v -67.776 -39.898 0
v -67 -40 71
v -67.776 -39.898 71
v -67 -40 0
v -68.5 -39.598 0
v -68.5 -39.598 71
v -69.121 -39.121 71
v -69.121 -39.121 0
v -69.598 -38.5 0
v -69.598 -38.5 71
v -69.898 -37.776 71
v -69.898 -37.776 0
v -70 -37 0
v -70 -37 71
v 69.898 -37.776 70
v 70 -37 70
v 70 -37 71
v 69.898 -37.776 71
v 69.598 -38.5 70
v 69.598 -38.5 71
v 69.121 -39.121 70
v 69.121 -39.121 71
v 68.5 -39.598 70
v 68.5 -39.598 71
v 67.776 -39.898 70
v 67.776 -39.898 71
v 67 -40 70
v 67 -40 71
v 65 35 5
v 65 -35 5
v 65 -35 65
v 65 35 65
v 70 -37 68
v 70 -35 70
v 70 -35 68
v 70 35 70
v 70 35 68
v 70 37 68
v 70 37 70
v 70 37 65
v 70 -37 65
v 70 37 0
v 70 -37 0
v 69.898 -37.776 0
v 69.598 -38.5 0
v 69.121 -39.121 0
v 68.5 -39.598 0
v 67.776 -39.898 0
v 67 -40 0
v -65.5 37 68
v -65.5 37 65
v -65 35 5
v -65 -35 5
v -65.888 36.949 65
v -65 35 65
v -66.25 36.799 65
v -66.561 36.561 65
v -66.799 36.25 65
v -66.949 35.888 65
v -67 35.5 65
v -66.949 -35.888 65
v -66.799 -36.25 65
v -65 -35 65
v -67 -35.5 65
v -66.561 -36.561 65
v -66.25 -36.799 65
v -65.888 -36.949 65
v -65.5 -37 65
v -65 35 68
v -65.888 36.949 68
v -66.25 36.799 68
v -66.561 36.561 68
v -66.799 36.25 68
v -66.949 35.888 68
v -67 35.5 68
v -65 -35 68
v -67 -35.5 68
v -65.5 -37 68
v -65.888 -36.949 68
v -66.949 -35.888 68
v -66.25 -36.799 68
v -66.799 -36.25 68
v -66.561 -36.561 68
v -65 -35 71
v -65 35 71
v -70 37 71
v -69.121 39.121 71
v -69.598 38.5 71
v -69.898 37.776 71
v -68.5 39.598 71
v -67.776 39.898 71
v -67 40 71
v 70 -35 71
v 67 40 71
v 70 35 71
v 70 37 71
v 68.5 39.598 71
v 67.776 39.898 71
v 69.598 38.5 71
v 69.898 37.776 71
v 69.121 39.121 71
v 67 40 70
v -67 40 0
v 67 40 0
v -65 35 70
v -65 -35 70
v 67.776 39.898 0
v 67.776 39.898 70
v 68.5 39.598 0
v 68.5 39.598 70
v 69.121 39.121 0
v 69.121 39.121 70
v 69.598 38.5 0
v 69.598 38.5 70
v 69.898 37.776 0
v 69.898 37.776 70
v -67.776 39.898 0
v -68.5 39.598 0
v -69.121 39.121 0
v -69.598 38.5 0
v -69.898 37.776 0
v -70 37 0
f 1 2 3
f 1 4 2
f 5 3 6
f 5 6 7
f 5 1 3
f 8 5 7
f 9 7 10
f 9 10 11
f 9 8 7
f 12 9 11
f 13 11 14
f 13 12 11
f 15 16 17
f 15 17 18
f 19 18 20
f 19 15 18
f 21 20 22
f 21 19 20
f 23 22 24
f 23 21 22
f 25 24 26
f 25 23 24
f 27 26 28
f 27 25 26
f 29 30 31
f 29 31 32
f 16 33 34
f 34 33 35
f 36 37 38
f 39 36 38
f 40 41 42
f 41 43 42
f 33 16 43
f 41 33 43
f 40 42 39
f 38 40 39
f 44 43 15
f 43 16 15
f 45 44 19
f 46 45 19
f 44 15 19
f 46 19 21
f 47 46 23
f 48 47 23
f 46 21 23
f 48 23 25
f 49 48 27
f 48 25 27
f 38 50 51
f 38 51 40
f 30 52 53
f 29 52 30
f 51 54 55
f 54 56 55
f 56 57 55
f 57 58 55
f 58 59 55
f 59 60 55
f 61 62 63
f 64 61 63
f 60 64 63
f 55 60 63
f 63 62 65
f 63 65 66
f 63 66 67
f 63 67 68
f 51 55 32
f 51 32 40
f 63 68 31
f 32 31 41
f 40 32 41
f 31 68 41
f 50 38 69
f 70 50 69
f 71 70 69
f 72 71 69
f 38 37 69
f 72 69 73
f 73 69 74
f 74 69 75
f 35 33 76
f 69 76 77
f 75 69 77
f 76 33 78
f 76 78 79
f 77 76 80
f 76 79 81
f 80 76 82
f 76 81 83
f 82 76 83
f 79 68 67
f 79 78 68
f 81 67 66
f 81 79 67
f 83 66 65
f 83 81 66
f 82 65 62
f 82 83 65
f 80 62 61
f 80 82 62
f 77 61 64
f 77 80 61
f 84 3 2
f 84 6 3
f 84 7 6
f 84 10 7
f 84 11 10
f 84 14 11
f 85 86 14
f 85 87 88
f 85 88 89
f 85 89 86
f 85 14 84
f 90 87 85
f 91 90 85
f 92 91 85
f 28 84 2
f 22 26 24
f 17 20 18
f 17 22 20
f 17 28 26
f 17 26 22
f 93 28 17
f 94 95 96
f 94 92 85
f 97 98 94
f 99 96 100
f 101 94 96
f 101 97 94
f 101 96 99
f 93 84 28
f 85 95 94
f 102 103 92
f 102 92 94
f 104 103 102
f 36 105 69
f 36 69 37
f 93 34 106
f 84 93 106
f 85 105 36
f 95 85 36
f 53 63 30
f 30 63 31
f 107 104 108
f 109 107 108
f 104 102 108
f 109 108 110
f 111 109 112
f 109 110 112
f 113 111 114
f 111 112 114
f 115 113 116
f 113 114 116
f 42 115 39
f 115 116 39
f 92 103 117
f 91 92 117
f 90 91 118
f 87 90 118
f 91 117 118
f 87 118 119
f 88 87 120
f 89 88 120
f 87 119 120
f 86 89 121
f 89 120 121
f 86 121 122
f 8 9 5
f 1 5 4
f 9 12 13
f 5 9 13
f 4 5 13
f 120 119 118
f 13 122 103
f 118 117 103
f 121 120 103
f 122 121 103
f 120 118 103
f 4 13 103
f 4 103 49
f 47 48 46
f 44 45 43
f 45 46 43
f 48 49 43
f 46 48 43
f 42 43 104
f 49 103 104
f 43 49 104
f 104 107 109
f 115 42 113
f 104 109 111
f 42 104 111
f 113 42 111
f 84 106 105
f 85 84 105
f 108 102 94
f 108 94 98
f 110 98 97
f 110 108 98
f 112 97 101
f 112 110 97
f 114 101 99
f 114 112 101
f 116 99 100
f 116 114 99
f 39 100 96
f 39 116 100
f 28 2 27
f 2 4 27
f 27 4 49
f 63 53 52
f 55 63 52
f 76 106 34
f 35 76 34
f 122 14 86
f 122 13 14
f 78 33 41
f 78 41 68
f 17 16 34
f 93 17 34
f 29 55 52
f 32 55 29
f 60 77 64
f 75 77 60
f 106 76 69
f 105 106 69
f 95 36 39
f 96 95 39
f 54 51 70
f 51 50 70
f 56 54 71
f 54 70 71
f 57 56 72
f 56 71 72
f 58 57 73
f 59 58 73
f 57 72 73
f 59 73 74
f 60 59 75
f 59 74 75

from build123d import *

# Parameters (mm, degrees)
F0_W      = 140
F0_H      = 80
F0_W_2    = 130
F0_H_2    = 70
F1_DEPTH  = 70
F2_DEPTH  = 5
F3_W      = 5
F3_H      = 70
F4_DEPTH  = 5
F6_DEPTH  = 2
F8_DEPTH  = 2
F10_DEPTH = 2
F11_R     = 2.99999
F12_R     = 1.5
F13_DEPTH = 1


# Not quite as in the source:
# - a fillet or chamfer is up to 0.001 mm smaller than in the source, because OpenCascade refuses the exact size


with BuildPart() as f1:
    # F0 (on Top) → F1 (new body)
    with BuildSketch(Plane.XY):
        Rectangle(F0_W, F0_H)
        Rectangle(F0_W_2, F0_H_2, mode=Mode.SUBTRACT)
    extrude(amount=F1_DEPTH)

    # F0 (on Top) → F2 (join)
    with BuildSketch(Plane.XY):
        Rectangle(F0_W_2, F0_H_2)
    extrude(amount=F2_DEPTH)

    # F3 (on face) → F4 (cut)
    with BuildSketch(Plane.XY.offset(70)):
        with Locations((67.5, 0)):
            Rectangle(F3_W, F3_H)
    extrude(amount=-F4_DEPTH, mode=Mode.SUBTRACT)

    # F5 (on face) → F6 (cut)
    with BuildSketch(Plane.XZ.offset(-35)):
        Polygon((65, 65), (70, 65), (70, 68), (-65, 68), (-65, 65), align=None)
    extrude(amount=-F6_DEPTH, mode=Mode.SUBTRACT)

    # F7 (on face) → F8 (cut)
    with BuildSketch(Plane.YZ.offset(-65)):
        Polygon((35, 65), (37, 65), (37, 68), (35, 68), (-35, 68), (-35, 65), align=None)
    extrude(amount=-F8_DEPTH, mode=Mode.SUBTRACT)

    # F9 (on face) → F10 (cut)
    with BuildSketch(Plane(origin=(0, -35, 0), x_dir=(-1, 0, 0), z_dir=(0, 1, 0))):
        Polygon((65, 65), (67, 65), (67, 68), (65, 68), (-70, 68), (-70, 65), (-65, 65), align=None)
    extrude(amount=-F10_DEPTH, mode=Mode.SUBTRACT)

    # F11 (radius 3 in the source; OpenCascade refuses exactly that, so slightly less here)
    f11_edges = [f1.edges().sort_by_distance(p)[0] for p in [
        (-70, -40, 35),
        (-70, 40, 35),
        (70, 40, 35),
        (70, -40, 35),
    ]]
    fillet(f11_edges, radius=F11_R)

    # F12
    f12_edges = [f1.edges().sort_by_distance(p)[0] for p in [
        (-67, -37, 66.5),
        (-67, 37, 66.5),
    ]]
    fillet(f12_edges, radius=F12_R)

    # F13 (add): a face of the model
    f13_faces = [f1.faces().sort_by_distance(p)[0] for p in [
        (-68.3875484503, 0, 70),
    ]]
    extrude(f13_faces, amount=F13_DEPTH)


solid = f1.part
